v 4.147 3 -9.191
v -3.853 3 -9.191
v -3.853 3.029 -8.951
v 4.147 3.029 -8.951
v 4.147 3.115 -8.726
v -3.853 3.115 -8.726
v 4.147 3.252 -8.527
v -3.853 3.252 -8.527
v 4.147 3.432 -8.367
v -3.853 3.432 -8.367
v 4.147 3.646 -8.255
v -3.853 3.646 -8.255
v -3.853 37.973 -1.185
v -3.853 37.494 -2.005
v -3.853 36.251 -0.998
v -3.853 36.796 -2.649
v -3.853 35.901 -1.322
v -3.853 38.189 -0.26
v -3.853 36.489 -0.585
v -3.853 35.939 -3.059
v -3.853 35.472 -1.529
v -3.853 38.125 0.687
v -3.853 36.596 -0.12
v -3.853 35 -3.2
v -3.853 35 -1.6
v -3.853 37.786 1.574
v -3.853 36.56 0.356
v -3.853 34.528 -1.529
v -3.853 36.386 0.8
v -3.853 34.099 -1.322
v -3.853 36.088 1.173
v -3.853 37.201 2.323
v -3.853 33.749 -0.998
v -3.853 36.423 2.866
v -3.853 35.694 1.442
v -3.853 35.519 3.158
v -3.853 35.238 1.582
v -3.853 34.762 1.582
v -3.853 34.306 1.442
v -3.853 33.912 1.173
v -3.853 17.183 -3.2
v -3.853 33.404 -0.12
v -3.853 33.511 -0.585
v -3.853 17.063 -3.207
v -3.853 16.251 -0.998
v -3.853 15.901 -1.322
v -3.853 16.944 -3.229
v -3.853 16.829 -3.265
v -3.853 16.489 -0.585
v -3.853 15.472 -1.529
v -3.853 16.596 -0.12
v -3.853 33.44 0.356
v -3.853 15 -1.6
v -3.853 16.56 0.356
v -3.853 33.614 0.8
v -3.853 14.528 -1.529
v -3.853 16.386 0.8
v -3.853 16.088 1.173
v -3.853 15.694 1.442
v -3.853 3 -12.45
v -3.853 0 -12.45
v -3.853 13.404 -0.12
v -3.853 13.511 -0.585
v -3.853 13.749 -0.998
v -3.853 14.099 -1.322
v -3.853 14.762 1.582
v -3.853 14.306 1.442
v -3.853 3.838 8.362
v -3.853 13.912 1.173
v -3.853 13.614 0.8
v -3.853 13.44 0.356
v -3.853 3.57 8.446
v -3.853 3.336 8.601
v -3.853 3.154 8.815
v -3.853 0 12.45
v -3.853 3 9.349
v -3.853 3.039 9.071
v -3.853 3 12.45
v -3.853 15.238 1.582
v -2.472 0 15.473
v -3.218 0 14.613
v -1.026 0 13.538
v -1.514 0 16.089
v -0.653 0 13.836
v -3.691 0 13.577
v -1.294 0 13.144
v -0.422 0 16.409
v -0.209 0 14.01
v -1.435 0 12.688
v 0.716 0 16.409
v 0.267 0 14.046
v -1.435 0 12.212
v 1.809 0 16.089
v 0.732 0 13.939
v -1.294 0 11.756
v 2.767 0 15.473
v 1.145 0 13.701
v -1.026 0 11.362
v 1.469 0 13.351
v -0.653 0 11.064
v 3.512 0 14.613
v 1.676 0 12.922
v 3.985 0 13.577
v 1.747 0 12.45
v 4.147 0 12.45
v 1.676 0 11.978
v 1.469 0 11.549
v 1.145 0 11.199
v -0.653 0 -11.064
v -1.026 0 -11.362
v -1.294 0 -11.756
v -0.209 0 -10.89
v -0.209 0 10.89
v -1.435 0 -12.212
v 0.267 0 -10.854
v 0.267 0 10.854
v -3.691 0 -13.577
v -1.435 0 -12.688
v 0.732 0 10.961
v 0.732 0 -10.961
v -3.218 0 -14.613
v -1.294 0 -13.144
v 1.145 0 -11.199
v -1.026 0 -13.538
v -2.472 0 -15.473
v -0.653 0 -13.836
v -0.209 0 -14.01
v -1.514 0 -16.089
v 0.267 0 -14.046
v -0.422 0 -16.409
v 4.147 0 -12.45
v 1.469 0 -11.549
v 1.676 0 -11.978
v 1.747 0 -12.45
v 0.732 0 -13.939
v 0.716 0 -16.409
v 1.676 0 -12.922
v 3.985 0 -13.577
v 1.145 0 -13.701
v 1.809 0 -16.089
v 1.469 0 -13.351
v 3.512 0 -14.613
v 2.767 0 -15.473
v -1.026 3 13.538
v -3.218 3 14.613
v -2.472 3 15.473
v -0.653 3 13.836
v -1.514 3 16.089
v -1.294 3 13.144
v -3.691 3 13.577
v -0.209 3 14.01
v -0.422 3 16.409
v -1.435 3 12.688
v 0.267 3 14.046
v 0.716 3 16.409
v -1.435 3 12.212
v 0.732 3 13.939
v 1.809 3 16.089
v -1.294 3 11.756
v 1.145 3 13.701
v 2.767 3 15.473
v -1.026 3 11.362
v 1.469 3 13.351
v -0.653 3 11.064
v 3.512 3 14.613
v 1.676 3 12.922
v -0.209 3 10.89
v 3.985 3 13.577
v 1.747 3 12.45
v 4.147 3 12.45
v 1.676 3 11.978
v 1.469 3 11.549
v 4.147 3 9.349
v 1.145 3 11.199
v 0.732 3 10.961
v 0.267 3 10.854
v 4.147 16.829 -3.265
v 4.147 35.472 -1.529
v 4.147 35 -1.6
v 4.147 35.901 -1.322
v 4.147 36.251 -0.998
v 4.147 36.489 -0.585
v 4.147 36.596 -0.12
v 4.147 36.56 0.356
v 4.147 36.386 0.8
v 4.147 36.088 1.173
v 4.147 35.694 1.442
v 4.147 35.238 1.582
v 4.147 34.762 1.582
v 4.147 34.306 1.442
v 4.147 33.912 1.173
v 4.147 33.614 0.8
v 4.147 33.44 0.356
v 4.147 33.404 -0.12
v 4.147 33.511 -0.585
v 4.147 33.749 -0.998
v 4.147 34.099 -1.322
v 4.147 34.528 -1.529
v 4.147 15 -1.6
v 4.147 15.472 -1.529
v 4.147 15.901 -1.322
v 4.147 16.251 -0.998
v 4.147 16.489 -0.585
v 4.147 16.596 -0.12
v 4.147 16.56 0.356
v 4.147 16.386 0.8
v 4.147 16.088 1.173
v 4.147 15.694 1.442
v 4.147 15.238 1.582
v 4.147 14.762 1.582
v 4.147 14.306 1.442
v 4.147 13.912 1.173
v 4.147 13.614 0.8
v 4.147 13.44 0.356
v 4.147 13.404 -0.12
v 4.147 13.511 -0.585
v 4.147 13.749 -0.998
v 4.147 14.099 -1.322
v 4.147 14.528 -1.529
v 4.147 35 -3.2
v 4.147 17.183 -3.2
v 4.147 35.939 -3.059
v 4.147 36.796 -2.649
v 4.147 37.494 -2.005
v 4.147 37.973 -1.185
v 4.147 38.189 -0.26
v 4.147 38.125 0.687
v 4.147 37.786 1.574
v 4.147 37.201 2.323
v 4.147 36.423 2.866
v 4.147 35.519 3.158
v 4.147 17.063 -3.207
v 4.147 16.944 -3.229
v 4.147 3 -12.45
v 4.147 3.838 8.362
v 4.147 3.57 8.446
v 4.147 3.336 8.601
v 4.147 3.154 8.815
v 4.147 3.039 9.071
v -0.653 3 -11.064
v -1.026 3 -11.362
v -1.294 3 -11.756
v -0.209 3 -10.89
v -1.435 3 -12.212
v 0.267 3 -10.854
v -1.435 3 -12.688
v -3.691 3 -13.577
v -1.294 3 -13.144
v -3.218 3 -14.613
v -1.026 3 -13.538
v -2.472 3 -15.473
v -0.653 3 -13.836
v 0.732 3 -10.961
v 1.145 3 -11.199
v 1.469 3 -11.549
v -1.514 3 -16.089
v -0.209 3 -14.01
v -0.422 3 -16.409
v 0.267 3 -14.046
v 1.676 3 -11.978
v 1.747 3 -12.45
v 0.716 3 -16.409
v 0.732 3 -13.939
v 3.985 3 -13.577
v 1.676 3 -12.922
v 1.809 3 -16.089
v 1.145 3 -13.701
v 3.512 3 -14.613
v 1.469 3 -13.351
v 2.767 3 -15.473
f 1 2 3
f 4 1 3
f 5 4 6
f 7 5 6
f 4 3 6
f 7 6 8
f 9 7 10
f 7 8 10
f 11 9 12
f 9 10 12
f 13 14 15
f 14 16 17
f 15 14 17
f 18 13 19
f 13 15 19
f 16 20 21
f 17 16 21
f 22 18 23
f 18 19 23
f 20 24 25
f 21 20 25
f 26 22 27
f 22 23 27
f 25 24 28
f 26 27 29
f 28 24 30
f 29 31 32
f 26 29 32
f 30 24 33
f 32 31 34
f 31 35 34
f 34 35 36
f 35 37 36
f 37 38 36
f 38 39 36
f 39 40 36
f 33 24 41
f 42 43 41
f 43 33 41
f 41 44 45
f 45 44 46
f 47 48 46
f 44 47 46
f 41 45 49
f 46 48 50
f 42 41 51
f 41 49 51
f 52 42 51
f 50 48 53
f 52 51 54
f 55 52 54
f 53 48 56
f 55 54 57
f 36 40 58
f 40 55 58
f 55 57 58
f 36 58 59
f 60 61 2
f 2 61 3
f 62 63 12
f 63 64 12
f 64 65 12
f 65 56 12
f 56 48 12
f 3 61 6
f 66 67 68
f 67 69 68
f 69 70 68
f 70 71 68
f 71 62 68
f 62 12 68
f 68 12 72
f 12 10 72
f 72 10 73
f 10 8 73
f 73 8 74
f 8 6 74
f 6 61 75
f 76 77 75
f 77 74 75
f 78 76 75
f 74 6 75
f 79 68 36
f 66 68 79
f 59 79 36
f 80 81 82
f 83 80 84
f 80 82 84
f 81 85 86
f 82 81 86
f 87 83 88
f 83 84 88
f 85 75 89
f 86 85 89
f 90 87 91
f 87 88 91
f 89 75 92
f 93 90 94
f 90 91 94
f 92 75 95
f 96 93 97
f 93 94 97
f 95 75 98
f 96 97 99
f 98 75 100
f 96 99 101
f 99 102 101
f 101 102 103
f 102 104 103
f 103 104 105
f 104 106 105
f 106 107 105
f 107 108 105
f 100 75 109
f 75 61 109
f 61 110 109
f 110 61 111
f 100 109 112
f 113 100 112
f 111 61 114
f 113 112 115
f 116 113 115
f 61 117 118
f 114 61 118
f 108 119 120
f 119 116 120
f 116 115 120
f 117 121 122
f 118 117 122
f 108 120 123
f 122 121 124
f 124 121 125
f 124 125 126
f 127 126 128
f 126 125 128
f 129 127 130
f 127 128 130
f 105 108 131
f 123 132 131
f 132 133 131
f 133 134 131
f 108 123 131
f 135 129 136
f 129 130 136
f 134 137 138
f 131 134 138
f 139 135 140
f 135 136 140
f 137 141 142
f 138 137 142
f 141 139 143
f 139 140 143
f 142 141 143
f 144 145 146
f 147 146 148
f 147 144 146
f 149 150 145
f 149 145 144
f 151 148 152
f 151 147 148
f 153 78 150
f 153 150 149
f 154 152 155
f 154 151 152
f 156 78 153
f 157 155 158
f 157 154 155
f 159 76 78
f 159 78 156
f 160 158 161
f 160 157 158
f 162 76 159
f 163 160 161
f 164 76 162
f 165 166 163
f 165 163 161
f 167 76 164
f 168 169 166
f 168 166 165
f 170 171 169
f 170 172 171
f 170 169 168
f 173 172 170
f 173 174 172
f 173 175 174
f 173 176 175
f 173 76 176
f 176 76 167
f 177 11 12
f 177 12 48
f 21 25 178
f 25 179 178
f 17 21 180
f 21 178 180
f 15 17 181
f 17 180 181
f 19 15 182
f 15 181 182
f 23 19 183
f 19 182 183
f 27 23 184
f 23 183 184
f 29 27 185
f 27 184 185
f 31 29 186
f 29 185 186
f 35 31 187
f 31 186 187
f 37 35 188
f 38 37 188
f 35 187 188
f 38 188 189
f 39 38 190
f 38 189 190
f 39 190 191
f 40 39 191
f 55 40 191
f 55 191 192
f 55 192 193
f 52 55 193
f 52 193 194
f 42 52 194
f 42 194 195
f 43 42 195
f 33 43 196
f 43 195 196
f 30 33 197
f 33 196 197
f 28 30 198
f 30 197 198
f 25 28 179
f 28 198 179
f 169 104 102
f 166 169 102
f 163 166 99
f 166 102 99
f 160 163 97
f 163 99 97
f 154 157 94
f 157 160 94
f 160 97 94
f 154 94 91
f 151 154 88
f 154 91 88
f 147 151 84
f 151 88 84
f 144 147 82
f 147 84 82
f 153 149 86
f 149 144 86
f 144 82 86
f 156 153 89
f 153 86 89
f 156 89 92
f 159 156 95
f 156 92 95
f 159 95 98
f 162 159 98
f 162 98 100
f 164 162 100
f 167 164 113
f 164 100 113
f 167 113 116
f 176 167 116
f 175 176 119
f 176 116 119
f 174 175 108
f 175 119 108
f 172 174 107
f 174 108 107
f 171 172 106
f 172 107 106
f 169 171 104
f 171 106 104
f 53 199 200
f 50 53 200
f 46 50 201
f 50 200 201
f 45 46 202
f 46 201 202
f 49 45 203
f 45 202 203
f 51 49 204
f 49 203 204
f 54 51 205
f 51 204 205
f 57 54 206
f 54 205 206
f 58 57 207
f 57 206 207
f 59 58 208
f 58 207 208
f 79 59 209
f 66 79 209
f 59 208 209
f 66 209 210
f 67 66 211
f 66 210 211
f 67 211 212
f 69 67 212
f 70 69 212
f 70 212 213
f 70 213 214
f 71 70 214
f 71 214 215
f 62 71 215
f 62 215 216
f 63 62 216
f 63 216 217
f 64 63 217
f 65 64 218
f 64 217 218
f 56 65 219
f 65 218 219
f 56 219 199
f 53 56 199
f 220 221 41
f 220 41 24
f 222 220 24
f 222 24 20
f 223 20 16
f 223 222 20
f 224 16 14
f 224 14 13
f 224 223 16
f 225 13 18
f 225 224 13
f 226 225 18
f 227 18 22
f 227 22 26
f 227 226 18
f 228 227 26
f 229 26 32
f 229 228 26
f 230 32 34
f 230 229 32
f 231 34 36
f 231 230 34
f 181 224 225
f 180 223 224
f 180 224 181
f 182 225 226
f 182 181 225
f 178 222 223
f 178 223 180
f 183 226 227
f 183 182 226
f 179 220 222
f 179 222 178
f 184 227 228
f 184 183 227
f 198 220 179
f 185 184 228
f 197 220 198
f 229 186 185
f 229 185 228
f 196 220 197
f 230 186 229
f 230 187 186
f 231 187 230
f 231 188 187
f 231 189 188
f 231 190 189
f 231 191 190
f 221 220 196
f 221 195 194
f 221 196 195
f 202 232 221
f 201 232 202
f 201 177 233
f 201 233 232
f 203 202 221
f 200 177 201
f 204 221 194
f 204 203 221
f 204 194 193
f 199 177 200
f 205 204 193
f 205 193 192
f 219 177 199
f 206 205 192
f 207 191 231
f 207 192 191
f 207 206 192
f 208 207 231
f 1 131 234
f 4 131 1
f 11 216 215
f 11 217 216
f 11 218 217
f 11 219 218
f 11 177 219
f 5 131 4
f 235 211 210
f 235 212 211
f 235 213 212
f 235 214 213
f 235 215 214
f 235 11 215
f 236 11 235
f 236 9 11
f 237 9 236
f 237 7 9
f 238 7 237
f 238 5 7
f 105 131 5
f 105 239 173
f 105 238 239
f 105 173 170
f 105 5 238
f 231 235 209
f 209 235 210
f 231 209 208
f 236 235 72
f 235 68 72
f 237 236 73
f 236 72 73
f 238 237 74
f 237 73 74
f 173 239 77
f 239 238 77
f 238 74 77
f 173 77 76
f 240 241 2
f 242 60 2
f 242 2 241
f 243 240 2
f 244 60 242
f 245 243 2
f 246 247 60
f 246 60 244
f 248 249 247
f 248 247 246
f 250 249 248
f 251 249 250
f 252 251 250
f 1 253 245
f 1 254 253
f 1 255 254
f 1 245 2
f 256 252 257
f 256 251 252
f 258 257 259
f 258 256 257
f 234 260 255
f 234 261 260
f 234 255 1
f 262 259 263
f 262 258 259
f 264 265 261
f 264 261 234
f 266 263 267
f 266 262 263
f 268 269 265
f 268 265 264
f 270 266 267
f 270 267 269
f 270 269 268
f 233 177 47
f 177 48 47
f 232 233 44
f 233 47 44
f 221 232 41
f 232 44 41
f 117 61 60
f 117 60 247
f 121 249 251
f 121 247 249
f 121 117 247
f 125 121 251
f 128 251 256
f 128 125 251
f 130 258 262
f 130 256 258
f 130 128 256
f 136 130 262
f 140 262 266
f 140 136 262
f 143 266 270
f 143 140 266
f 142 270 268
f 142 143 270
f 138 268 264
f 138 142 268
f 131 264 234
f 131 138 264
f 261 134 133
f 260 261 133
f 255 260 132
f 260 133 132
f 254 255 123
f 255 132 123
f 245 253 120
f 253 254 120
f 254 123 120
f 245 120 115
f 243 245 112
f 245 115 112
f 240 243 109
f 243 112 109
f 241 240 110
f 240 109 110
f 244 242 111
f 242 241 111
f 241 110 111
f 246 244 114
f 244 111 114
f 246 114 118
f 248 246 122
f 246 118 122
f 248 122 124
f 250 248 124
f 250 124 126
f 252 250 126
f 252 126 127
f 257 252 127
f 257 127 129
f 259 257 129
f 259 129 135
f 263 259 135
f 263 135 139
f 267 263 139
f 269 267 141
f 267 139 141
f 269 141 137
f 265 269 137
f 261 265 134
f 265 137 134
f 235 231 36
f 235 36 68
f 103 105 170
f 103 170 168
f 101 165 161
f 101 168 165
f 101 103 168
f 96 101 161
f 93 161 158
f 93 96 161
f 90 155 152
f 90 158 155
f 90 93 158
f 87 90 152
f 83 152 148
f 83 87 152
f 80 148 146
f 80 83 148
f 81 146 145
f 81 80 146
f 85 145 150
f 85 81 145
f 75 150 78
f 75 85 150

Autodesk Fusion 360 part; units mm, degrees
sketch "Skizze1" plane through (0, 0, 0) normal (0, 1, 0) x (1, 0, 0)
  circle A0 centre (0.1472, 12.45) radius 1.6
  circle A1 centre (0.1472, -12.45) radius 1.6
  line L0 (0, 0) -> (50, 0) construction
  line L1 (4.1472, 12.45) -> (4.1472, -12.45)
  line L2 (-3.8528, 12.45) -> (-3.8528, -12.45)
  arc A2 (4.1472, 12.45) -> (-3.8528, 12.45) centre (0.1472, 12.45) ccw
  arc A3 (-3.8528, -12.45) -> (4.1472, -12.45) centre (0.1472, -12.45) ccw
  dimension "d1" = 24.9
  dimension "d2" = 3.2
  dimension "d3" = 8
extrude "Extrusion1" add sketch "Skizze1" along normal blind 3
sketch "Skizze2" plane through (4.1472, 0, 0) normal (1, 0, 0) x (0, 0, -1)
  line L0 (-12.45, 0) -> (12.45, 0)
  line L1 (12.45, 0) -> (12.45, 3)
  line L2 (12.45, 3) -> (-12.45, 3)
  line L3 (-12.45, 3) -> (-12.45, 0)
  arc A0 (3.2, 35) -> (-3.1577, 35.5188) centre (0, 35) ccw
  line L4 (0, 0) -> (0, 43) construction
  circle A1 centre (0, 35) radius 1.6
  circle A2 centre (0, 15) radius 1.6
  line L5 (0, 25) -> (20, 25) construction
  line L6 (8.5, 3) -> (3.2, 17)
  line L7 (3.2, 17) -> (3.2, 35)
  line L8 (-3.1577, 35.5188) -> (-8.5, 3)
  dimension "d7" = 25
  dimension "d8" = 3.2
  dimension "d9" = 20
  dimension "d10" = 3.2
  dimension "d17" = 8.5
  dimension "d18" = 14
  dimension "d19" = 8.5
extrude "Extrusion2" add sketch "Skizze2" against normal blind 8 contours L2 A0 L6 L7 L8
fillet "Abrundung3" radius 1 3 edges at (0.1472, 17, -3.2) (0.1472, 3, -8.5) (0.1472, 3, 8.5)
